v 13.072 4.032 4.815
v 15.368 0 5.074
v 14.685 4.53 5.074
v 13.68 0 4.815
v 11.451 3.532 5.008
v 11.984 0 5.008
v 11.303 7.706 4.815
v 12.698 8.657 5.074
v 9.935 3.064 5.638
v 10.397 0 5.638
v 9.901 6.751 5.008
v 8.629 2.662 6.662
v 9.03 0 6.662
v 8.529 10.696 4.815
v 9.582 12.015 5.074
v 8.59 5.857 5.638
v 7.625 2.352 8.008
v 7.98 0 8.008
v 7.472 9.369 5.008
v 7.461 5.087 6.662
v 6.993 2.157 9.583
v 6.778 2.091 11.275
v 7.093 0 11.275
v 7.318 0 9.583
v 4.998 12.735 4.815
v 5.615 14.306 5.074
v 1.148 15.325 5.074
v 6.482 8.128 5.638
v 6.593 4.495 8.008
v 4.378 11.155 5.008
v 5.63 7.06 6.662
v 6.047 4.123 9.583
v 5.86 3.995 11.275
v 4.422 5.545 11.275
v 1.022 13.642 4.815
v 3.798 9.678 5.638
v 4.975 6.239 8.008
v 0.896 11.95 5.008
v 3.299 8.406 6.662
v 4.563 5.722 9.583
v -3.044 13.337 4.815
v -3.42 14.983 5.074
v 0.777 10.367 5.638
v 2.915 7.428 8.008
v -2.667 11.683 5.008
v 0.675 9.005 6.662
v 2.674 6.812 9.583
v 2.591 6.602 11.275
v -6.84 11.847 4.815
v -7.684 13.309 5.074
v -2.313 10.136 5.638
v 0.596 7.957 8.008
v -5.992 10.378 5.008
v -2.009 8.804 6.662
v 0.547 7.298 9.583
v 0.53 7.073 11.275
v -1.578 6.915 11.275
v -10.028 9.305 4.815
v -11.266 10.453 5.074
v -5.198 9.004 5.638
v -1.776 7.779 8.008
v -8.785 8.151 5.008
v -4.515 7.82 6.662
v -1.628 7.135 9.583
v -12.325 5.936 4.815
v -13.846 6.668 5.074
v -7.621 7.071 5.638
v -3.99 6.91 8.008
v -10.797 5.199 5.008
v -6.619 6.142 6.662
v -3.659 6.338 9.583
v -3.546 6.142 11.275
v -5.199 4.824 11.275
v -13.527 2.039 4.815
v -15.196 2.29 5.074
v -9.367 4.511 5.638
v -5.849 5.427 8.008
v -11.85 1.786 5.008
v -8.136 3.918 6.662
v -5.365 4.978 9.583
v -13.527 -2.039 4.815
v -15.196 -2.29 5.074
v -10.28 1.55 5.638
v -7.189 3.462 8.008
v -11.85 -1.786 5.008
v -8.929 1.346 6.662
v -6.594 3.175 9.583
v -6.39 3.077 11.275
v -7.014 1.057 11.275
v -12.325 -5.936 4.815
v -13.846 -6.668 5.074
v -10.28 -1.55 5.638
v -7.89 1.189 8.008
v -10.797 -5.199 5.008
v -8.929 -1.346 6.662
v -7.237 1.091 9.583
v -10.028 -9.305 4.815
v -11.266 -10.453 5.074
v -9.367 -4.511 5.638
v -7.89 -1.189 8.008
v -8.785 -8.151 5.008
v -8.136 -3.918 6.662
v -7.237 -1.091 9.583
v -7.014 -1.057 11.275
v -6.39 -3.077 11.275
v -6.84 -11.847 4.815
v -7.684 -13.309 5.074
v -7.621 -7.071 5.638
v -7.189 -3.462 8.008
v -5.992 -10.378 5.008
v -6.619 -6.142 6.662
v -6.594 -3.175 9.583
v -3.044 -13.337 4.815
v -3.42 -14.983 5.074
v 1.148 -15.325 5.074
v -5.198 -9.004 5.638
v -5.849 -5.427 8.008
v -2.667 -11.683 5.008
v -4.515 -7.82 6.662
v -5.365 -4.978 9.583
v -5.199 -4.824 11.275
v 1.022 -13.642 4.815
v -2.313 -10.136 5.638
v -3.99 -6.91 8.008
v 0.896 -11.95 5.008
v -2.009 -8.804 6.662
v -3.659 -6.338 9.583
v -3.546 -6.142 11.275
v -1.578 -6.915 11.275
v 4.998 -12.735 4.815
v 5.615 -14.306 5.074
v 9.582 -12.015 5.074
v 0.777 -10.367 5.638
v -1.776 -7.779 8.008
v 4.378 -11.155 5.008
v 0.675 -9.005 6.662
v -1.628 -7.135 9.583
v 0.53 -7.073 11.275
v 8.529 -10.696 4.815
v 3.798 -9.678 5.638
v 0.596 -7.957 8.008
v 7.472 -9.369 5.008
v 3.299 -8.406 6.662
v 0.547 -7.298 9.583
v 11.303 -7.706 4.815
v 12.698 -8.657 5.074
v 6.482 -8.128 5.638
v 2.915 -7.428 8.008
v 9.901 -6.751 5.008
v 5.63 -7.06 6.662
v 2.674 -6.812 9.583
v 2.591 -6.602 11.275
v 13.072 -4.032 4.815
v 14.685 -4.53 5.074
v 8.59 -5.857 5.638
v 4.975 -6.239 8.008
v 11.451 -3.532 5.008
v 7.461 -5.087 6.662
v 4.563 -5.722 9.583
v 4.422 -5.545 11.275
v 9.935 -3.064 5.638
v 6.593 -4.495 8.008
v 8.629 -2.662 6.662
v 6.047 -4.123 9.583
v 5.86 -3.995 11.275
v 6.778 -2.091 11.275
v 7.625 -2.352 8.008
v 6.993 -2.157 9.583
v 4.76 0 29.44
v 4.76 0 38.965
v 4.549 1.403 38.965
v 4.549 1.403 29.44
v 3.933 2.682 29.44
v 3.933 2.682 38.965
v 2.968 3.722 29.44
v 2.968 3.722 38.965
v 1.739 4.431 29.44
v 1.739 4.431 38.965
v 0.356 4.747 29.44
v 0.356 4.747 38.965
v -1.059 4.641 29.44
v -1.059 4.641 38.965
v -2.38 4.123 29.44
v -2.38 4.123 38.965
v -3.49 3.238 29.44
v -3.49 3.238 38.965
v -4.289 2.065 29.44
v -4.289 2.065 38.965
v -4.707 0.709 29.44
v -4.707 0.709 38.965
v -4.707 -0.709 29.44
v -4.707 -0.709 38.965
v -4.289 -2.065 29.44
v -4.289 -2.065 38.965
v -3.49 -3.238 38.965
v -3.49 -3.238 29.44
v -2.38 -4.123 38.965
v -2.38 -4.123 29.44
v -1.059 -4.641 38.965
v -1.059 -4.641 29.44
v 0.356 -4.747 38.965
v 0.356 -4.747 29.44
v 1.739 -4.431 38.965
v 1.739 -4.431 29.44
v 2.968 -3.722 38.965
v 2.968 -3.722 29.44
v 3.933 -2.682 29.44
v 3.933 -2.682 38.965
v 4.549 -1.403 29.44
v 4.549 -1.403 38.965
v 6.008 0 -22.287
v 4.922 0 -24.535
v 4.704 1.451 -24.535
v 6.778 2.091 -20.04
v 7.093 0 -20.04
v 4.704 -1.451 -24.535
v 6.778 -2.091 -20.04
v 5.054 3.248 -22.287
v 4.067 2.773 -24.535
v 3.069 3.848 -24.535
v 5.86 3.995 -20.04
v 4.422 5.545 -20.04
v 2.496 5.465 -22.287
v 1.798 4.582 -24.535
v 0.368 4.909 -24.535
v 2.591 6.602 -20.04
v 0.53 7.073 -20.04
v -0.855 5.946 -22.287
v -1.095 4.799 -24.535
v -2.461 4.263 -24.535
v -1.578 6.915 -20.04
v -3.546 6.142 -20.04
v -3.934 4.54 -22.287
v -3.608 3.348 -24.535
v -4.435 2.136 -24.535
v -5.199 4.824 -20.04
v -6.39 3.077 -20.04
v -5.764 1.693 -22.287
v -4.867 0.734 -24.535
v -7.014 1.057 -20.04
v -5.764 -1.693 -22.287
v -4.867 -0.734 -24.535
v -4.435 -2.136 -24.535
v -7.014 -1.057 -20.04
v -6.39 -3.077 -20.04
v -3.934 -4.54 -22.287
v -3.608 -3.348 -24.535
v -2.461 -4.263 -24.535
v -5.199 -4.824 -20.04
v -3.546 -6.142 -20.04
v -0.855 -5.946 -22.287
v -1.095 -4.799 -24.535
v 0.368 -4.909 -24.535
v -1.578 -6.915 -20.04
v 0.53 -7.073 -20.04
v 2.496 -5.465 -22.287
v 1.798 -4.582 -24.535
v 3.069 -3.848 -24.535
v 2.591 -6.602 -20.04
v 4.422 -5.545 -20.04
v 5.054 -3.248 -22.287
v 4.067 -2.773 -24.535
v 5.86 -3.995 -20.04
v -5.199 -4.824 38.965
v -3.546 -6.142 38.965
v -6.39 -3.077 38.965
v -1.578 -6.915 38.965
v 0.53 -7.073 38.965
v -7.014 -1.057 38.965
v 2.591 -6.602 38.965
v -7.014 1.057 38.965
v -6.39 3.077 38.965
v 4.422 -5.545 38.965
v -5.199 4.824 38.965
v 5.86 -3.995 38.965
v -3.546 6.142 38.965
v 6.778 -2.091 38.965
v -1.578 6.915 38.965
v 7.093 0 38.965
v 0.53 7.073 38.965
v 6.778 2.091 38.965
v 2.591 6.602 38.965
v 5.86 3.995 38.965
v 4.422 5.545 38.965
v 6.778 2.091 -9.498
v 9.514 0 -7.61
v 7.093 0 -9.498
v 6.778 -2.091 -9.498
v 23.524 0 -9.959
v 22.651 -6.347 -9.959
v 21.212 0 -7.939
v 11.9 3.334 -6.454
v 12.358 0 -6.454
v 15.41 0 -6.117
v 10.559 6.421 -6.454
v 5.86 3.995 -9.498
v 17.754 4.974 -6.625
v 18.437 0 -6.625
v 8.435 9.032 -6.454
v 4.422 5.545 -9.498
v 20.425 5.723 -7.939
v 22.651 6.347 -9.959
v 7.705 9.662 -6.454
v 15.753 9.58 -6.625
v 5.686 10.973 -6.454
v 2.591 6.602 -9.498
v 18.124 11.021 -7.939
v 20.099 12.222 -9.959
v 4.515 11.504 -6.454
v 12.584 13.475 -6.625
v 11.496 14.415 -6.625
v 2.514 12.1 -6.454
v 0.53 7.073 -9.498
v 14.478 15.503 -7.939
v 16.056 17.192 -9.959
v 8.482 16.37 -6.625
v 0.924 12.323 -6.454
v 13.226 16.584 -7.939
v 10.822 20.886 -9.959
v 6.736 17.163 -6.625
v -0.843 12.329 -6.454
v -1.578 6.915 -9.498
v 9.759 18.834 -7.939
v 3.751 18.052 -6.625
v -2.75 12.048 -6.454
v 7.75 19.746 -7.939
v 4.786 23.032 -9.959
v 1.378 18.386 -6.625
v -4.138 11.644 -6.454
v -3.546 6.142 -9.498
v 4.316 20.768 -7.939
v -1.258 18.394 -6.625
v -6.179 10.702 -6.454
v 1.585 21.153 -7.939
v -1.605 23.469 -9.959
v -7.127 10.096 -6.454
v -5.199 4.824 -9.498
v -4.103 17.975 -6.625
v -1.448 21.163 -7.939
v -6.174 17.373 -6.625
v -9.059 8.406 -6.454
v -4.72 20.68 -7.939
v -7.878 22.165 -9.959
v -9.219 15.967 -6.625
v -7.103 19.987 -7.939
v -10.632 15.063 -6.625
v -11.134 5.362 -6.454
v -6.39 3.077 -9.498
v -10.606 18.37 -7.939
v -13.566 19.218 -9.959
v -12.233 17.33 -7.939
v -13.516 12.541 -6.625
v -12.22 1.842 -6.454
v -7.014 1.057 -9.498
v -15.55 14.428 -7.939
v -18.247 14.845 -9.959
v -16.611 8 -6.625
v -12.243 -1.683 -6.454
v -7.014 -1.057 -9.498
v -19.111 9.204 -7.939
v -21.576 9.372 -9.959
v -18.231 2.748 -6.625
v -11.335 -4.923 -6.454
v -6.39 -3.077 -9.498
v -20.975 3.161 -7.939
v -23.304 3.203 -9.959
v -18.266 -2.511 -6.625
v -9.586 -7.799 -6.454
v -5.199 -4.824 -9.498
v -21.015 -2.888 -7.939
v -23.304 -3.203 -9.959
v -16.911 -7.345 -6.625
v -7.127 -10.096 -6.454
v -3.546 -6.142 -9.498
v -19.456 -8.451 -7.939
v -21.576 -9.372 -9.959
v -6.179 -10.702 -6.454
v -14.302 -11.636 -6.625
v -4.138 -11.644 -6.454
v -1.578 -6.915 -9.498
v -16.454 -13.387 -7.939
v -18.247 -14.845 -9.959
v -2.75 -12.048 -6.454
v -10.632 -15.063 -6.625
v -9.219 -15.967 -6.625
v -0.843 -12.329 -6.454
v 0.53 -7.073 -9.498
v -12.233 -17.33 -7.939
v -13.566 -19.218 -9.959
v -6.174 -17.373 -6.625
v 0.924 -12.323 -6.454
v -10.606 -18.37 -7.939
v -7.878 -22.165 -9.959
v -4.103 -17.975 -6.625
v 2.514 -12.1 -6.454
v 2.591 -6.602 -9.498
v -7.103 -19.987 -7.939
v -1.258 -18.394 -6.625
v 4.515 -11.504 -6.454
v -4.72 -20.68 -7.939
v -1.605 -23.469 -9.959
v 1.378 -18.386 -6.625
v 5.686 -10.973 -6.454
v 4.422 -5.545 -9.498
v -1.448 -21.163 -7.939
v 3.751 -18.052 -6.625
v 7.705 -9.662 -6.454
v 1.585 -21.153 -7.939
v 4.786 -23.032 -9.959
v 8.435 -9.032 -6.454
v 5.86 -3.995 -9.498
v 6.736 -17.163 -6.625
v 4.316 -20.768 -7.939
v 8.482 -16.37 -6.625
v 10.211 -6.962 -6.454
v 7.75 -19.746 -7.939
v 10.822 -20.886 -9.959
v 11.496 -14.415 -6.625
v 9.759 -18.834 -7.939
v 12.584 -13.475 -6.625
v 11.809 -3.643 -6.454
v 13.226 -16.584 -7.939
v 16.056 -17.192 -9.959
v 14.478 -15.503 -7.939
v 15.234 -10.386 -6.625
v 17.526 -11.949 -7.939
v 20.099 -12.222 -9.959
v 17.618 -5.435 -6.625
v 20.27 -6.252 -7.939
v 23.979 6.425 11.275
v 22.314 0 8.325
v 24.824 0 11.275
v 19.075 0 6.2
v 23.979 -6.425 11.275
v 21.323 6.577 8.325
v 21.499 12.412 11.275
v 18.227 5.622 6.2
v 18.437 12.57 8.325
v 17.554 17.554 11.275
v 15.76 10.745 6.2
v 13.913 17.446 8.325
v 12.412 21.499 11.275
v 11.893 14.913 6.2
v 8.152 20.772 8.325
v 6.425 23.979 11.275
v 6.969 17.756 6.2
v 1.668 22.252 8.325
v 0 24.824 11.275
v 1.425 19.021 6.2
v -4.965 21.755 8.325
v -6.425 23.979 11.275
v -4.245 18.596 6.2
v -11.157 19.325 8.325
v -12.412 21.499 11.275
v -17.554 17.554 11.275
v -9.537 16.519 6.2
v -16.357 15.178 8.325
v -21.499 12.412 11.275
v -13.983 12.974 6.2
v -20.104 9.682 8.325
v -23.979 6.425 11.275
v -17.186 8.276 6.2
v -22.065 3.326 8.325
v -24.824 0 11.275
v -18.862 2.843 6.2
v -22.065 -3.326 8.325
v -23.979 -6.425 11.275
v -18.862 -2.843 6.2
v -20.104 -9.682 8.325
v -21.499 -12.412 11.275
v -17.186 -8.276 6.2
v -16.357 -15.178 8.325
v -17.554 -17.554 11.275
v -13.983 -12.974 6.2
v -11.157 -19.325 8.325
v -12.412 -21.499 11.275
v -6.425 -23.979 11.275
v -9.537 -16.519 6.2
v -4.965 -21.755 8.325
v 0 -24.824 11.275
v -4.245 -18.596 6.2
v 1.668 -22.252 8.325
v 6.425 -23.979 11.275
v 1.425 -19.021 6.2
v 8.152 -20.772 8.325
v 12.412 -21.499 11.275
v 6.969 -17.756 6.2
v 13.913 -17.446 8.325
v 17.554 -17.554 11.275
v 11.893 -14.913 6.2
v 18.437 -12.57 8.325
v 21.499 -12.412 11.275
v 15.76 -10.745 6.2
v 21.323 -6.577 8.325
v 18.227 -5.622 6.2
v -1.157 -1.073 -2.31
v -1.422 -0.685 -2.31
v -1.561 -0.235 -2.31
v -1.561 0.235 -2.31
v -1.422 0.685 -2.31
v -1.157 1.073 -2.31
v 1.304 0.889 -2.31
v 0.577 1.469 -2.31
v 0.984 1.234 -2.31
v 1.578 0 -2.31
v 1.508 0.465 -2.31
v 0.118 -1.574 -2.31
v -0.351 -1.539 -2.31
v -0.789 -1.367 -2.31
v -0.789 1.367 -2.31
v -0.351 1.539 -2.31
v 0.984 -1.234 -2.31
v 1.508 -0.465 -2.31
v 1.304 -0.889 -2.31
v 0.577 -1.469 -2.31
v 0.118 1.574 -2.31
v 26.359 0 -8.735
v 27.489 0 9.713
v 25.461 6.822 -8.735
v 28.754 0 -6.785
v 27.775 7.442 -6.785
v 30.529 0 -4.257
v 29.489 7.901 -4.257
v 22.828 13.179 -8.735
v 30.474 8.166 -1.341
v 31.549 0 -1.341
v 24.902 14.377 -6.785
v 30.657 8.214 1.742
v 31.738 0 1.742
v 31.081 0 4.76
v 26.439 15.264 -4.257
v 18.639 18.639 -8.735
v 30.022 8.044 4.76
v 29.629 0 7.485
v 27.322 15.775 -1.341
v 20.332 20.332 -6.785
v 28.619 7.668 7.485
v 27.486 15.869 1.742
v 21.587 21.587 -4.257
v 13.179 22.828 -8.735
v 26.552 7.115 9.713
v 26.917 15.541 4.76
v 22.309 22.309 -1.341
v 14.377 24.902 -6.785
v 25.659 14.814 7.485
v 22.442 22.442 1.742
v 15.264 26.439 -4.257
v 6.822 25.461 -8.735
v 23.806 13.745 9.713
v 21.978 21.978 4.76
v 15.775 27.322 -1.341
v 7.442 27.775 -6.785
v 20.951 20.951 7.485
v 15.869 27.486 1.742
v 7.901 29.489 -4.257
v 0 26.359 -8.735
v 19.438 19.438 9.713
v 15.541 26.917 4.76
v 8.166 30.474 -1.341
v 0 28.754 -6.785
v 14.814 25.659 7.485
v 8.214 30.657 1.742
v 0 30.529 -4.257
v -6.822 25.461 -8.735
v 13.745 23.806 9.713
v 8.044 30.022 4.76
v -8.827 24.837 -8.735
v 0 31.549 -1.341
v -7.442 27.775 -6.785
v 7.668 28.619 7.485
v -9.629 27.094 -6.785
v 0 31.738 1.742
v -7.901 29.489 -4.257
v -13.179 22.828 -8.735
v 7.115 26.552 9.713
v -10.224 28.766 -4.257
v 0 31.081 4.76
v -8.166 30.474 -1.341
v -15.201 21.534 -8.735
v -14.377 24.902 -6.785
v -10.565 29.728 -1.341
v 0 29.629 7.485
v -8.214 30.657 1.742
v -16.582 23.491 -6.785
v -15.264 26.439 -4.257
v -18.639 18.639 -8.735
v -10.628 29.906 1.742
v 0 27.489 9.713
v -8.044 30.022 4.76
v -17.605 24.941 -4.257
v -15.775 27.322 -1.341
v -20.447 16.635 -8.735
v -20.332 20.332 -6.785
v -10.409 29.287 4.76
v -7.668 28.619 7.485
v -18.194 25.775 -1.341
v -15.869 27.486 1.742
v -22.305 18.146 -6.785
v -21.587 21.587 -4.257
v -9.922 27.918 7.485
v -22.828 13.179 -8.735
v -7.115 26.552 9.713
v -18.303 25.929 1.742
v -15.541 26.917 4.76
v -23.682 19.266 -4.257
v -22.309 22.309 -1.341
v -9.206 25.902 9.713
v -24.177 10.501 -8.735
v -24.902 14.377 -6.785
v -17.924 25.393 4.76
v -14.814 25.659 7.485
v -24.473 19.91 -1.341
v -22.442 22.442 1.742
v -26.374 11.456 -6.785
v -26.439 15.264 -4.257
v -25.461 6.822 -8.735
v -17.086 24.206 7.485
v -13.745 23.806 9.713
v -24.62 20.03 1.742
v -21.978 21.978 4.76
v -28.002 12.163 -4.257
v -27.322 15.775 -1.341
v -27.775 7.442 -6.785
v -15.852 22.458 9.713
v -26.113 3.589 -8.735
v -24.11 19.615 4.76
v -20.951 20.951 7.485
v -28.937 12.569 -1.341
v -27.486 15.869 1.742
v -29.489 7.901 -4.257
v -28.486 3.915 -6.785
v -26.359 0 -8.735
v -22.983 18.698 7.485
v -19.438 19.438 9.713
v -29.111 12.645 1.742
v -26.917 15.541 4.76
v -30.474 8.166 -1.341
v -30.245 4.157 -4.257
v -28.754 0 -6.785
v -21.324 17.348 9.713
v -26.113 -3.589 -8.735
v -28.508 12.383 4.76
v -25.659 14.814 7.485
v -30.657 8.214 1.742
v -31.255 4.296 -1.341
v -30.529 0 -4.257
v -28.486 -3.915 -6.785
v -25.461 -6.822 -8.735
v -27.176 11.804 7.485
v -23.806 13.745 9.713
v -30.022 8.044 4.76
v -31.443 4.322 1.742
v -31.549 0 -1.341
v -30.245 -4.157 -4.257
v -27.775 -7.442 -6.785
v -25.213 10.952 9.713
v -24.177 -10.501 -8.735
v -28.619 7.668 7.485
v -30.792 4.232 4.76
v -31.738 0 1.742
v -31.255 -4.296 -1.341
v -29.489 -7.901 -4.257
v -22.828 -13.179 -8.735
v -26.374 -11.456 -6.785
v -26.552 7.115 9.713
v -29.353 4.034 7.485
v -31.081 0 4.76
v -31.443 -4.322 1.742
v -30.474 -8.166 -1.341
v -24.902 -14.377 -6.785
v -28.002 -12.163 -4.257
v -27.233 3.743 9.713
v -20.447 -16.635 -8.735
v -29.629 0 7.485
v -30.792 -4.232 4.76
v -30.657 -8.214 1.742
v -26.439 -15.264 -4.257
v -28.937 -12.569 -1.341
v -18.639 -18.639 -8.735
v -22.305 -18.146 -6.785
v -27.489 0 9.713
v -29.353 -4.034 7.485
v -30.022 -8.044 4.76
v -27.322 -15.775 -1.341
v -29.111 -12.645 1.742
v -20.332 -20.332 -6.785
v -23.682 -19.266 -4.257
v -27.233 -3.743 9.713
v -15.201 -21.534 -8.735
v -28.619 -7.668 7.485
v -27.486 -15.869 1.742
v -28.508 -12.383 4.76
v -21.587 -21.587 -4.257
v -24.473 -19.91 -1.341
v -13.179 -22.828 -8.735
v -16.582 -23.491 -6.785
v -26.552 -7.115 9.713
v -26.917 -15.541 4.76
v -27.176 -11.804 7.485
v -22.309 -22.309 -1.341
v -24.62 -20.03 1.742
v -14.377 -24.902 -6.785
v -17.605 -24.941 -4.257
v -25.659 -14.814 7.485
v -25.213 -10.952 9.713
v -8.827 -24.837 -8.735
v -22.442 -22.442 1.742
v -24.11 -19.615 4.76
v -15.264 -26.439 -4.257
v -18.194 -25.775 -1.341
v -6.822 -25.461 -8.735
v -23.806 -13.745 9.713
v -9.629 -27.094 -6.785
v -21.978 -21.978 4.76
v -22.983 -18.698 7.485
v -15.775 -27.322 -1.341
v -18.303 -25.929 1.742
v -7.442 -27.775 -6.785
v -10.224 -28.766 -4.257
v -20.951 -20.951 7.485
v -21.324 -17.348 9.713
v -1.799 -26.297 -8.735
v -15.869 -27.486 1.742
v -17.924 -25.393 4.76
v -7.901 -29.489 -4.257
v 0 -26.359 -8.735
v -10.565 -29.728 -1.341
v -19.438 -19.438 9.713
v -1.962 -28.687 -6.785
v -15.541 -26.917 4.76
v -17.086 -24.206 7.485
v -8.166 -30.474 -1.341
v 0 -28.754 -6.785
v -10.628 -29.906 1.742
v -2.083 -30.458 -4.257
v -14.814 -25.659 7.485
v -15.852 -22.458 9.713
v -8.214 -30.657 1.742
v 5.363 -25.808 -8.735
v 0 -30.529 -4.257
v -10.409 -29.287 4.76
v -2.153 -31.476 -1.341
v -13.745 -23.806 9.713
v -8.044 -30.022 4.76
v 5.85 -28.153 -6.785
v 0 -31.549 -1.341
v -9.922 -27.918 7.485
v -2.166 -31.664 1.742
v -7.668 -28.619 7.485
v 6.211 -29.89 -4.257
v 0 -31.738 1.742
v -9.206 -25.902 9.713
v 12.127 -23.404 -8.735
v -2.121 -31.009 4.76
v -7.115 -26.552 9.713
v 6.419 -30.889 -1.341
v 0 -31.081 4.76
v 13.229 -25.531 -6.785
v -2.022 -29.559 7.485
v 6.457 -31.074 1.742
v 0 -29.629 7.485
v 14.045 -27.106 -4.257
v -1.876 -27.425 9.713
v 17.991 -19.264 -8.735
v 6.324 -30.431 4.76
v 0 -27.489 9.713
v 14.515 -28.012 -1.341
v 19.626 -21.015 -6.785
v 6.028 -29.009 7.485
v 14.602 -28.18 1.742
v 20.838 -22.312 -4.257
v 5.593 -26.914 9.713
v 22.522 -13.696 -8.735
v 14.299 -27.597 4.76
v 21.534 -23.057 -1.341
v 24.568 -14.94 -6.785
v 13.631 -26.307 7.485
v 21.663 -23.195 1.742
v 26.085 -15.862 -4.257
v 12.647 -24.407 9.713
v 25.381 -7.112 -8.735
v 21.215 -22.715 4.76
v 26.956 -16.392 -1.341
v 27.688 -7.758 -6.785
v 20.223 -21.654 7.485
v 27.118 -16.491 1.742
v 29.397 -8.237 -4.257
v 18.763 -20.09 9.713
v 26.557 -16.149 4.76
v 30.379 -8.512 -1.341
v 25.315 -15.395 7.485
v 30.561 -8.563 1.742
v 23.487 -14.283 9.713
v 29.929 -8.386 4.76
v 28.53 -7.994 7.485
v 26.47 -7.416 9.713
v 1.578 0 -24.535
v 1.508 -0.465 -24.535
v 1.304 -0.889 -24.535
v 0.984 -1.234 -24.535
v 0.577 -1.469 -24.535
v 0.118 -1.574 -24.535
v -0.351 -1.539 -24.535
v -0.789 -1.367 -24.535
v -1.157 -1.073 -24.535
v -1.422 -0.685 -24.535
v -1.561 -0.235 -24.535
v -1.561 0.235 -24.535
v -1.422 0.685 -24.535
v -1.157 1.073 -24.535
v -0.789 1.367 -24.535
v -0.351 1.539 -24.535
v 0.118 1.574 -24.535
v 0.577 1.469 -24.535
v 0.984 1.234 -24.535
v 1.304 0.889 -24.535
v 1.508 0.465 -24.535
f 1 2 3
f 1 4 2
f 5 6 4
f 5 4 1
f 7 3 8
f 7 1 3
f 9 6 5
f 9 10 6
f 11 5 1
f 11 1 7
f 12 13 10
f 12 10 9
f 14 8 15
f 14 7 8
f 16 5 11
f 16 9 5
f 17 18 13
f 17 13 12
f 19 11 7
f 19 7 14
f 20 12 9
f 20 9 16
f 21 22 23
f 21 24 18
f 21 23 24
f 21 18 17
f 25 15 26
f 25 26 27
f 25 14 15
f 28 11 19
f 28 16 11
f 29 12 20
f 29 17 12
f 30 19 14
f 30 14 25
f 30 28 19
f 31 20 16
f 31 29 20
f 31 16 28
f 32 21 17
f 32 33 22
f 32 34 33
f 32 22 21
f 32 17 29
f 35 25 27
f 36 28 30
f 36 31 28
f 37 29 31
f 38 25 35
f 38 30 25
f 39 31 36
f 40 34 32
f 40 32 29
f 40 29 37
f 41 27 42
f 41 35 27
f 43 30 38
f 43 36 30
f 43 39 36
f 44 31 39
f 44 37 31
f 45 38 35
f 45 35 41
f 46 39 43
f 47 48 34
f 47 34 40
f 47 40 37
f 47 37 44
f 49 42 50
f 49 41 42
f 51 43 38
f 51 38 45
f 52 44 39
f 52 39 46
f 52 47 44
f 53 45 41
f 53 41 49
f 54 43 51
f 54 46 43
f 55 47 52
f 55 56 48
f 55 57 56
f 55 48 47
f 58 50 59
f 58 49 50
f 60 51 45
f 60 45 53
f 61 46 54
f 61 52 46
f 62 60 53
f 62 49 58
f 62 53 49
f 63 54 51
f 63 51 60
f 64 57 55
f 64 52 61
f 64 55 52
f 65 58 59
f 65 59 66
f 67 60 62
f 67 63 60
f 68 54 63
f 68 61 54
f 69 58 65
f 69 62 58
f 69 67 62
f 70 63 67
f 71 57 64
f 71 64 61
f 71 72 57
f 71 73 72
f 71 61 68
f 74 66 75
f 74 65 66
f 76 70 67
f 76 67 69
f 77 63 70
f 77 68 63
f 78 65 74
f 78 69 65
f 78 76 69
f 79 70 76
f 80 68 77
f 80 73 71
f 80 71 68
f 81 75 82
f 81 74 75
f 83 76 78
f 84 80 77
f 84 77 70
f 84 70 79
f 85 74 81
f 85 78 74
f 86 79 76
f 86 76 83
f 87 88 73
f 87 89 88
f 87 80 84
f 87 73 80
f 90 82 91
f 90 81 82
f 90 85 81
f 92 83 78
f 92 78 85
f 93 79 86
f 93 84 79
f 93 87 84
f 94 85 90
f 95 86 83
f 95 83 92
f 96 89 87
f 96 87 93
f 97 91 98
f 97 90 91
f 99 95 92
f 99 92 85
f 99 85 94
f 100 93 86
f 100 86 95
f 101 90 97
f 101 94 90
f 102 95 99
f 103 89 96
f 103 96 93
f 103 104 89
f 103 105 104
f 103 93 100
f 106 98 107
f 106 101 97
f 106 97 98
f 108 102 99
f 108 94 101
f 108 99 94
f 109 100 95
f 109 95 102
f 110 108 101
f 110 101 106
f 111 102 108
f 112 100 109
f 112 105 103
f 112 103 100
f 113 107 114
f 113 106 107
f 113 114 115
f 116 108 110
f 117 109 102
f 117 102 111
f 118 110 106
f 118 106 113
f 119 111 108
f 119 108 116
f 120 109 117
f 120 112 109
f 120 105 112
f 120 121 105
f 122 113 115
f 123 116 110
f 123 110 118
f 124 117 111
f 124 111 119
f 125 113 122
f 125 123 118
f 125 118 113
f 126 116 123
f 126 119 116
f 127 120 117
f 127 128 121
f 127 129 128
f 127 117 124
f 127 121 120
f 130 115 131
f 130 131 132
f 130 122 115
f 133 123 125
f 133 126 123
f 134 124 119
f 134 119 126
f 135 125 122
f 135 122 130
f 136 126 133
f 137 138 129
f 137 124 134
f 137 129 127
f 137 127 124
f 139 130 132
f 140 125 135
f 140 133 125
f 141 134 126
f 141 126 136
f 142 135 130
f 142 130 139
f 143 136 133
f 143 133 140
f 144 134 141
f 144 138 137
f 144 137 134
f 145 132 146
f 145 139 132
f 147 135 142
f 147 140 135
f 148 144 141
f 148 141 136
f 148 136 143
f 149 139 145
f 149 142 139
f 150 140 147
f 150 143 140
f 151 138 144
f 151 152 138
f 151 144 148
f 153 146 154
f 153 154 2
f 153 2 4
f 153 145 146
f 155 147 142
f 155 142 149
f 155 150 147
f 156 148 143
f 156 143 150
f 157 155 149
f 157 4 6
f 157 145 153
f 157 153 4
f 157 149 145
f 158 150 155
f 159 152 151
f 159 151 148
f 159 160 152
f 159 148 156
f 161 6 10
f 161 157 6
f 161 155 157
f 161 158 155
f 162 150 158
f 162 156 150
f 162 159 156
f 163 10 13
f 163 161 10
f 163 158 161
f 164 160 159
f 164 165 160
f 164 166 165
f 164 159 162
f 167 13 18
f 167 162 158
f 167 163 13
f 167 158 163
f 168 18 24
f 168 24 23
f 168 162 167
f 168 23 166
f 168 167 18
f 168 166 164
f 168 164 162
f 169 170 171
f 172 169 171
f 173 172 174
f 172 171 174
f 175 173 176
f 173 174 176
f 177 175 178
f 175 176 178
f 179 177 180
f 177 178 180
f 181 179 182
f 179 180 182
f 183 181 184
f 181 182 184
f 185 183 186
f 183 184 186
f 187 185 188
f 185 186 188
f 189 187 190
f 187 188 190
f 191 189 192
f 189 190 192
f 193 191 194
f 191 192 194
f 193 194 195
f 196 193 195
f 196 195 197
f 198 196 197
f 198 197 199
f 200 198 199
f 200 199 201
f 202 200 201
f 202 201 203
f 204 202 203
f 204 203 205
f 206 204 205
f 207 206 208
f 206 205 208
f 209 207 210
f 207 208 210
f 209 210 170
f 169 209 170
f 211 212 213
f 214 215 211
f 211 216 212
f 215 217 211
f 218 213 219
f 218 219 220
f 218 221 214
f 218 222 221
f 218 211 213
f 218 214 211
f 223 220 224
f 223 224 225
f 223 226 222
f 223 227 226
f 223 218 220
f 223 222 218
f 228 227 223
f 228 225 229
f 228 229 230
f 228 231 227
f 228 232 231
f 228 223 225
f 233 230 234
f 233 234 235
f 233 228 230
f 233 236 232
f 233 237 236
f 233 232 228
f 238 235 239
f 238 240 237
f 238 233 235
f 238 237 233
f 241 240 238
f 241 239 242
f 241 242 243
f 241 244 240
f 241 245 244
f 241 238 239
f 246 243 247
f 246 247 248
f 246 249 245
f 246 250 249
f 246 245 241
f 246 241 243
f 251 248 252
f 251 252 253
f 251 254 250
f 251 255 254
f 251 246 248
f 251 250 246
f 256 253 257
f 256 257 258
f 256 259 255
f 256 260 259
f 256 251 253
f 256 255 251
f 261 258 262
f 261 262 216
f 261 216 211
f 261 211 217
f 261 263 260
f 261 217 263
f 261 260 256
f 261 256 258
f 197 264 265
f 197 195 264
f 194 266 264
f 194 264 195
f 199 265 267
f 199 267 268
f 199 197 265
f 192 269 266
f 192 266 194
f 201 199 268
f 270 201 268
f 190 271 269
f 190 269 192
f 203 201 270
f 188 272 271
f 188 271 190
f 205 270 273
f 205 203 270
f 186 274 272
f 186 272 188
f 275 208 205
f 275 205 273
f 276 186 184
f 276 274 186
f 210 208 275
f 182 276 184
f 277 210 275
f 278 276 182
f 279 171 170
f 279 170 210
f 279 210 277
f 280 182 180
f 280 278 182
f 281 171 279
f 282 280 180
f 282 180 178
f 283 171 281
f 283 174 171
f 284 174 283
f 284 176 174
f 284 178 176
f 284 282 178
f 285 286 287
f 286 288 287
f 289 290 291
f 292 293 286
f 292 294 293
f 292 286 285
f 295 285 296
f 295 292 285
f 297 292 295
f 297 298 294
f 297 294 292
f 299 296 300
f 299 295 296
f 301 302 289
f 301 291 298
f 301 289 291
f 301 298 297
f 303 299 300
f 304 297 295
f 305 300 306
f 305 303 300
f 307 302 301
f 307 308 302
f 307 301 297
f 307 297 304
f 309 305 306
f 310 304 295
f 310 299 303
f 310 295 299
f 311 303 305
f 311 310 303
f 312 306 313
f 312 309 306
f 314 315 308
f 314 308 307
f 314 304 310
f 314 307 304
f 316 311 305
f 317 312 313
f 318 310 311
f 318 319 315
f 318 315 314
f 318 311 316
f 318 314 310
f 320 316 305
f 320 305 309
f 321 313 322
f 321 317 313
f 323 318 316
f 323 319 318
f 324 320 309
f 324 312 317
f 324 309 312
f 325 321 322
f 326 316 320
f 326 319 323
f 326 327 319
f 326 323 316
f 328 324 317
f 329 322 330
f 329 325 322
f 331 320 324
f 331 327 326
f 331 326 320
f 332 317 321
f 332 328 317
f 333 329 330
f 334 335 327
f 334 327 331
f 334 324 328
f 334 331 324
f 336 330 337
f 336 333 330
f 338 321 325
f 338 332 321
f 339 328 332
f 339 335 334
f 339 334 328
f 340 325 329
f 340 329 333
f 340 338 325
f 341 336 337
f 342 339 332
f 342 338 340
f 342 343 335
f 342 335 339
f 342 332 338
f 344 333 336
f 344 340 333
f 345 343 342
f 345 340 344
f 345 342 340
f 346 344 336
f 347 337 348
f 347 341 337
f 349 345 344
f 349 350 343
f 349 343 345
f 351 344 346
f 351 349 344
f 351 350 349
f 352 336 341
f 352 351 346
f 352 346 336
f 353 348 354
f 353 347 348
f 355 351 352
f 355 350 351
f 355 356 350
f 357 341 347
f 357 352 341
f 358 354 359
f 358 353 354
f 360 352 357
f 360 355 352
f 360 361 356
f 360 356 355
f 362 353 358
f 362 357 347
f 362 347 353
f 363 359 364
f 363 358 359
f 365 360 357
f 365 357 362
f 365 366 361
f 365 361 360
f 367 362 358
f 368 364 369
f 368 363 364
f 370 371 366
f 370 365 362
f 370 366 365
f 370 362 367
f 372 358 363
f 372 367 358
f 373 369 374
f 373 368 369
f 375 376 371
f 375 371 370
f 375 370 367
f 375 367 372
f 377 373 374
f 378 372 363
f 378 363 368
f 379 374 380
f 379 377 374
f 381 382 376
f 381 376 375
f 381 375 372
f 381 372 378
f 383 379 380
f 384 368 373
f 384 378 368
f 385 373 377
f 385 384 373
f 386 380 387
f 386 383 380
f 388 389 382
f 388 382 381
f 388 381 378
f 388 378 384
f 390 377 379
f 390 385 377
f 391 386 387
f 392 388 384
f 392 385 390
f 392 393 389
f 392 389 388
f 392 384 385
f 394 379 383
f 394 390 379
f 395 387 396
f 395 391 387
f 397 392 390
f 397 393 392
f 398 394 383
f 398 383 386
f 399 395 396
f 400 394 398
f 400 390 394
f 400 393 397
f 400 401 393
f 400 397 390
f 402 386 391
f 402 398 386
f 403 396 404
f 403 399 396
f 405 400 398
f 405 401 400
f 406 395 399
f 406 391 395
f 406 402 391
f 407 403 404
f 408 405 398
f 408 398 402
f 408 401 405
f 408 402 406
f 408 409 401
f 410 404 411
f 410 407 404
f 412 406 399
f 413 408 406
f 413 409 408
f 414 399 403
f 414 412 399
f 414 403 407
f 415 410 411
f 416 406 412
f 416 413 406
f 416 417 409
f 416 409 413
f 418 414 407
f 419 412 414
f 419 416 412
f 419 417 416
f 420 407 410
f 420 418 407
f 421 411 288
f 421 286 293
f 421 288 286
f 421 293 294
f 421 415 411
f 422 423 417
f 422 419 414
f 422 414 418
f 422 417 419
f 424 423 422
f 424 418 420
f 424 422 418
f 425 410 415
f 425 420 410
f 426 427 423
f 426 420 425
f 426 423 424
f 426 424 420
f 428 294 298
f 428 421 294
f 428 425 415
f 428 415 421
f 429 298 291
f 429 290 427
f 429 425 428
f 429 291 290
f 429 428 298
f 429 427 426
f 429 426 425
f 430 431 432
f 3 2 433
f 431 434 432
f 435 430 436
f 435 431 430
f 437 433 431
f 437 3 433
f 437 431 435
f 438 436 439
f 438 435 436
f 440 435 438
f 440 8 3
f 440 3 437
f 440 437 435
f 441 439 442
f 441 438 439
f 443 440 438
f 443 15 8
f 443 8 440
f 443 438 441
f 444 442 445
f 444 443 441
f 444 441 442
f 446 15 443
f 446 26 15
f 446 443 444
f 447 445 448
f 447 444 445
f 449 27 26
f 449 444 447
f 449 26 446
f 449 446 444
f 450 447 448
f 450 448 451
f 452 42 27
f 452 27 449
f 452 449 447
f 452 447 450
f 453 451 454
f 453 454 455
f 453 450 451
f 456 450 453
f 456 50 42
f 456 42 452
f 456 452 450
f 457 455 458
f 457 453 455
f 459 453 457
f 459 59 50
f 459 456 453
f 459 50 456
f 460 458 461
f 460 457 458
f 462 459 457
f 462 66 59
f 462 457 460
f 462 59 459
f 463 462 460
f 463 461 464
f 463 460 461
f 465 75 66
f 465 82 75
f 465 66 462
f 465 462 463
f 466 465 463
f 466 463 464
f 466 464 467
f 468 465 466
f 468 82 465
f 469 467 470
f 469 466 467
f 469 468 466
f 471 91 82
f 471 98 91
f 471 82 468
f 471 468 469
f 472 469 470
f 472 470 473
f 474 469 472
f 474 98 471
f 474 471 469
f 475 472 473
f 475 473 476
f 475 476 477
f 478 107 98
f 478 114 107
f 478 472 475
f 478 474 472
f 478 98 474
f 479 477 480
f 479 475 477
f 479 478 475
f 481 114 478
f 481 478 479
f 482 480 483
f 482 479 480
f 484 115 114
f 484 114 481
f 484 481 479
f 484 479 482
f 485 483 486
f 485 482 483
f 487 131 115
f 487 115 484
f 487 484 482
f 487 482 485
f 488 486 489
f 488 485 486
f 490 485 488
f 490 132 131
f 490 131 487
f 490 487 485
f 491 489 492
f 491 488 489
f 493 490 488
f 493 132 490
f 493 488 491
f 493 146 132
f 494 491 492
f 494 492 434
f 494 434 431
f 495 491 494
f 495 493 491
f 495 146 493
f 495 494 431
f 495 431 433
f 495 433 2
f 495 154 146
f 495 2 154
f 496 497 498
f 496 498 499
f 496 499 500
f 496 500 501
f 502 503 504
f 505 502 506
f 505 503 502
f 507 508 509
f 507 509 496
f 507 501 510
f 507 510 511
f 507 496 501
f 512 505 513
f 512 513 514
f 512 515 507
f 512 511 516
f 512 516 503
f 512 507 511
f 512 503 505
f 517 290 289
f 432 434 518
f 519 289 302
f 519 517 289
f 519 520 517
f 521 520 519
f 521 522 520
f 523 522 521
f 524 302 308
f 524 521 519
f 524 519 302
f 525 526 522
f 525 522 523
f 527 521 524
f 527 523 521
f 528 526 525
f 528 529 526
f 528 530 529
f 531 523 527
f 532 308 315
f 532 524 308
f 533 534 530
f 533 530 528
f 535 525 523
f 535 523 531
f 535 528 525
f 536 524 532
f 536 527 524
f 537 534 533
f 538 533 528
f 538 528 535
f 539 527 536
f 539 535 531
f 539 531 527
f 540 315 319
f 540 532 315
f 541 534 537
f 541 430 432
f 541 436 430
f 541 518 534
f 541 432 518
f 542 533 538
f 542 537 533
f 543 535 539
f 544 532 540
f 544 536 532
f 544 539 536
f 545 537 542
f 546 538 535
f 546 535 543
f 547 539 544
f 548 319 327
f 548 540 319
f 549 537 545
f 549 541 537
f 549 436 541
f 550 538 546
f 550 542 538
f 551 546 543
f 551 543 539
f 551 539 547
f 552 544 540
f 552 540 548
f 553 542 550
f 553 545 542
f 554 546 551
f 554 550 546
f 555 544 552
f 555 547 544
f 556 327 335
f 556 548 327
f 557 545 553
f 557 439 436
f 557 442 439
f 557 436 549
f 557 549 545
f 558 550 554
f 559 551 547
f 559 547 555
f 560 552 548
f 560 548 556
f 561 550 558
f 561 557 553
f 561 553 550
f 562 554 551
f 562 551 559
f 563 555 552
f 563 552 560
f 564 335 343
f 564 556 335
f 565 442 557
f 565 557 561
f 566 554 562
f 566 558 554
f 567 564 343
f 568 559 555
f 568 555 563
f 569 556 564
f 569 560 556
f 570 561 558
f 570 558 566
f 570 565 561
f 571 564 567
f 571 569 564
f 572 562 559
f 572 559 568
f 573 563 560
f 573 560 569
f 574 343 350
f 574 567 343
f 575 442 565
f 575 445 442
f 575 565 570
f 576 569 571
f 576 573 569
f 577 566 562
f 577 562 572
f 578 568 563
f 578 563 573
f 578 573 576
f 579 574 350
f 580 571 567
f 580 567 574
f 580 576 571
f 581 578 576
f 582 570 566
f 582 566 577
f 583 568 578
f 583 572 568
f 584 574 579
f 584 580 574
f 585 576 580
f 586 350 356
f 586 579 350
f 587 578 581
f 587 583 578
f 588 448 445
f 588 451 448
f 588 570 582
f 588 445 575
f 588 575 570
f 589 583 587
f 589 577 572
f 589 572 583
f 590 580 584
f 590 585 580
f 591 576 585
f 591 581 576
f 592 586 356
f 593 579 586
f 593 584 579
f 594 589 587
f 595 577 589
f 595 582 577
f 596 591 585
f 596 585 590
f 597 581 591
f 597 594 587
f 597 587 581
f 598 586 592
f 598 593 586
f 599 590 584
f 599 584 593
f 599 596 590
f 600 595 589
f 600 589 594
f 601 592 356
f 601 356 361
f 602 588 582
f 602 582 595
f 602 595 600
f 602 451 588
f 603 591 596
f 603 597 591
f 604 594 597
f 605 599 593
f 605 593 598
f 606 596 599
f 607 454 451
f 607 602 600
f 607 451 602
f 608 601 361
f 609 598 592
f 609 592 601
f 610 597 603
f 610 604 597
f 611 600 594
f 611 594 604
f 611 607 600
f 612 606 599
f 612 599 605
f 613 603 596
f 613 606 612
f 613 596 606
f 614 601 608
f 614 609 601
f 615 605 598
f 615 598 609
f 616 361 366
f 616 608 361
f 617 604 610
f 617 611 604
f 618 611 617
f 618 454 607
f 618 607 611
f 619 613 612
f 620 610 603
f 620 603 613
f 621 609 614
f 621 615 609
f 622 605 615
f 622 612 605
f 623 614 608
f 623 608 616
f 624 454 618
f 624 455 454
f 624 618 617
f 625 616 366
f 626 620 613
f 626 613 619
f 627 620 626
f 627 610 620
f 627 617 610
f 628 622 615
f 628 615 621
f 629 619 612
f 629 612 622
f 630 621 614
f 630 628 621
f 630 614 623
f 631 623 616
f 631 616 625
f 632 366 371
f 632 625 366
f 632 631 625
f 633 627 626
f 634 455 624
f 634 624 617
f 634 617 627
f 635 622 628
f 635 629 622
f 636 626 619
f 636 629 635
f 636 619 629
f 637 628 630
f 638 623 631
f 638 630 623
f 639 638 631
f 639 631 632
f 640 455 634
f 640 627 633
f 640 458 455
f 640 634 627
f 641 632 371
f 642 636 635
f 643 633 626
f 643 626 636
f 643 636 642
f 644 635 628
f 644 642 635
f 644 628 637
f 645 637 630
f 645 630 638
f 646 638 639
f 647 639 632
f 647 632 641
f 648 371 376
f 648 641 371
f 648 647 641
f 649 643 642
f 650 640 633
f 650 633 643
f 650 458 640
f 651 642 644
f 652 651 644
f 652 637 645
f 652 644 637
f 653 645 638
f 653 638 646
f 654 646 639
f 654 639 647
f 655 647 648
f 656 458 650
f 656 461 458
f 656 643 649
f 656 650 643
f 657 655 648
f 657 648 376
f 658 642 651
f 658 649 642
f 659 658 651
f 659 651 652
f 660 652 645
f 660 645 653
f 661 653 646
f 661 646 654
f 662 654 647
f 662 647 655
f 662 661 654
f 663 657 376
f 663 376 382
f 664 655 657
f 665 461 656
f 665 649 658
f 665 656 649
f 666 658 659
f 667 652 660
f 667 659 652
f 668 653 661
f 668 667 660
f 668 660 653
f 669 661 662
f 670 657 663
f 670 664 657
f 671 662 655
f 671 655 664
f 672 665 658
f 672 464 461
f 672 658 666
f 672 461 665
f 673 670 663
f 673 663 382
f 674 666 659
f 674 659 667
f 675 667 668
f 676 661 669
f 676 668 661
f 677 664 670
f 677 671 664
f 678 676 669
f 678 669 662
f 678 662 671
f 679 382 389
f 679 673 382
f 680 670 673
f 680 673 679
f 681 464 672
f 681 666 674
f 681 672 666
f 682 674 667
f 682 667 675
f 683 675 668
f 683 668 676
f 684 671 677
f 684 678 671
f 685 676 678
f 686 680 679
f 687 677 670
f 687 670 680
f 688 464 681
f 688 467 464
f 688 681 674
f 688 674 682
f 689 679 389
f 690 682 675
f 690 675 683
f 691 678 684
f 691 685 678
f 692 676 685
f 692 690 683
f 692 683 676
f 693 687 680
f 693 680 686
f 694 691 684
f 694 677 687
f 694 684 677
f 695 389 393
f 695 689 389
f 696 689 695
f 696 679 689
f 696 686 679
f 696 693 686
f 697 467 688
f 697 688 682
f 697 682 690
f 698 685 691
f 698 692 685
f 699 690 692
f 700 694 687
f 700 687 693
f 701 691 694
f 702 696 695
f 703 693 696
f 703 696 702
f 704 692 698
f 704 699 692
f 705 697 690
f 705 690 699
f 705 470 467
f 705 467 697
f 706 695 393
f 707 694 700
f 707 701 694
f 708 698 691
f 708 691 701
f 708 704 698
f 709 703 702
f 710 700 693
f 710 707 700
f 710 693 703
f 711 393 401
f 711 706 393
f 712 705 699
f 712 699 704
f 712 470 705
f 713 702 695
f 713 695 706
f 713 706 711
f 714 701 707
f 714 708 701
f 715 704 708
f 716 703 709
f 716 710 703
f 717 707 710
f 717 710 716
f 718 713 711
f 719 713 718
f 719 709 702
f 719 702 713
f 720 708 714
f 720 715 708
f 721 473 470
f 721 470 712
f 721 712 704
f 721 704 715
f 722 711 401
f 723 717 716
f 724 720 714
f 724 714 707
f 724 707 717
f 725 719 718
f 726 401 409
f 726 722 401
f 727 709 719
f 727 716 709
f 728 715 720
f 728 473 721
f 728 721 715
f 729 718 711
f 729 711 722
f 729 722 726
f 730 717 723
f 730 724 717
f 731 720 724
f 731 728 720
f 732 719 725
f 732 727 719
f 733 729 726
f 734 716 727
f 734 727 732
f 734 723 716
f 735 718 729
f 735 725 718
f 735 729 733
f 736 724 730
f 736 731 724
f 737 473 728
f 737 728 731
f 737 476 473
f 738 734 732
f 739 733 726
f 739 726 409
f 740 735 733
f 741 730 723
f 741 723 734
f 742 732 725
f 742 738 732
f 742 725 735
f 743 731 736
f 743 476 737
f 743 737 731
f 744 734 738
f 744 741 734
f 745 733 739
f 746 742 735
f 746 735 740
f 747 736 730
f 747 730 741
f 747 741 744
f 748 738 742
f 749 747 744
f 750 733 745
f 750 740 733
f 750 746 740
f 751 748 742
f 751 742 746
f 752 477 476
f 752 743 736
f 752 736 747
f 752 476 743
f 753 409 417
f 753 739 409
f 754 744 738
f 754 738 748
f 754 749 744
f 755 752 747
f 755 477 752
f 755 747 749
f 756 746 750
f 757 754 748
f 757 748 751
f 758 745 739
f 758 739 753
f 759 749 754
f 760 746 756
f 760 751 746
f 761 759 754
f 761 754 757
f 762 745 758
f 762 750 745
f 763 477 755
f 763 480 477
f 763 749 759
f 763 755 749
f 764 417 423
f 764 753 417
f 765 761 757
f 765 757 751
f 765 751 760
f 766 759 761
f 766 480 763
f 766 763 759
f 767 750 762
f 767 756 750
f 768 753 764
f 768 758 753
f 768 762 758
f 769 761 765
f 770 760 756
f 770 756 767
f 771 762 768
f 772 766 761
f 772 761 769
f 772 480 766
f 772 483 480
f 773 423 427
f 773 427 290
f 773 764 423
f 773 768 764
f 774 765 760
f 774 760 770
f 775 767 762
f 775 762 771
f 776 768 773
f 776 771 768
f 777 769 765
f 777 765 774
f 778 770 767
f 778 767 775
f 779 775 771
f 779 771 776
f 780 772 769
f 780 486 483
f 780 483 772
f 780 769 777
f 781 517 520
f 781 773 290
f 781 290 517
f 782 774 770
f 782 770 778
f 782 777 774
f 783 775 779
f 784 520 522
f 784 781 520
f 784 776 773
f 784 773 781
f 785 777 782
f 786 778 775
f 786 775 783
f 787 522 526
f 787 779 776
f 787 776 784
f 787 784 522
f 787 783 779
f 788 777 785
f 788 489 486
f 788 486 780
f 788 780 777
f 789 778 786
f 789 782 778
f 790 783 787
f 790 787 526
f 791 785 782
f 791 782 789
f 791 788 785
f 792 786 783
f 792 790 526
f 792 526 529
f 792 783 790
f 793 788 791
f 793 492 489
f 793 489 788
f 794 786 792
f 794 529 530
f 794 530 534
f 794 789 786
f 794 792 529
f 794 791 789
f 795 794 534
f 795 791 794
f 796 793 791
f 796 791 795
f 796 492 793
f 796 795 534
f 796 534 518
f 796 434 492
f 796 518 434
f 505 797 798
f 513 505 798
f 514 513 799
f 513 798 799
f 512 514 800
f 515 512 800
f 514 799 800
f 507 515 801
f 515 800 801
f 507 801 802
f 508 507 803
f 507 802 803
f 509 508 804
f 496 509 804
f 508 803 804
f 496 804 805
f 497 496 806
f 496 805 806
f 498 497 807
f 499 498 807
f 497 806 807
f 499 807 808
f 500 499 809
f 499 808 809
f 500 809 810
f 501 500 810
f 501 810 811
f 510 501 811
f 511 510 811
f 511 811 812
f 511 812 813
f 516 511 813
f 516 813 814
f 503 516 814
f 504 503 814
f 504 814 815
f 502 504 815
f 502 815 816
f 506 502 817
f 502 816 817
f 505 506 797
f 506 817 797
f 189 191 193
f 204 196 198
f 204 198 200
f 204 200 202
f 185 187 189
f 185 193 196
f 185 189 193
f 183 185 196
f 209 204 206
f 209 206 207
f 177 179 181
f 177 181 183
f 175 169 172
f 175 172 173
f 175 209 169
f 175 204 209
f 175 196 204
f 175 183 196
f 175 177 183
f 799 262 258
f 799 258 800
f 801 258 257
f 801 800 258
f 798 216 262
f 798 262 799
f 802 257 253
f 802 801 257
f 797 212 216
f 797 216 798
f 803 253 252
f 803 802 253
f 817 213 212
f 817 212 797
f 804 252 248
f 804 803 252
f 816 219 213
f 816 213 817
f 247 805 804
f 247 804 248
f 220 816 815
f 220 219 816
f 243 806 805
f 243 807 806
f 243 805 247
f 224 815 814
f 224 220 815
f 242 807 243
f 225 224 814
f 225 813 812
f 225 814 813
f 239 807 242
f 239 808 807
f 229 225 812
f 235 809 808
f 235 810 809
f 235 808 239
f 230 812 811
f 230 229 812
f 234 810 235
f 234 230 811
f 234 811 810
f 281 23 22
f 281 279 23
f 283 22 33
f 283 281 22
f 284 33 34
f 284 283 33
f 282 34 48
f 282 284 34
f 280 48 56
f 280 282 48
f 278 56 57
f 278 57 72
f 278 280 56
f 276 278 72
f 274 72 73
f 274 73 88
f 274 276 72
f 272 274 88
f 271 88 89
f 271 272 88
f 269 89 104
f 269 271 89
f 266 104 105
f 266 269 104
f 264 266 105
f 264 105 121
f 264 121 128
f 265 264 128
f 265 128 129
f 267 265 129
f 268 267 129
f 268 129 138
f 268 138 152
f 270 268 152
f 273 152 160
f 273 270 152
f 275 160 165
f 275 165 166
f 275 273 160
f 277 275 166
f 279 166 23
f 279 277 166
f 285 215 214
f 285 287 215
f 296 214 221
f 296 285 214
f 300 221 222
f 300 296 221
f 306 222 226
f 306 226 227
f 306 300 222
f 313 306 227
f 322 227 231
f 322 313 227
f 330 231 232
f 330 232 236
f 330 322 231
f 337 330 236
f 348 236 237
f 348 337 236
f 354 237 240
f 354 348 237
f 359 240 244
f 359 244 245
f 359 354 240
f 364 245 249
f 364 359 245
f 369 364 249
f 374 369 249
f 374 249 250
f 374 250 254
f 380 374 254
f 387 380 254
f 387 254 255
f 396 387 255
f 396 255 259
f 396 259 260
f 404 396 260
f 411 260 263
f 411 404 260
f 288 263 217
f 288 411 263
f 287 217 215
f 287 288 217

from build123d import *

# Parameters (mm, degrees)
F2_R     = 4.760298
F3_DEPTH = 9.525
F4_R     = 1.578177
F5_DEPTH = 22.225


with BuildPart() as f1:
    # F0 (on Front) → F1 (revolve)
    with BuildSketch(Plane.XZ):
        with BuildLine():
            Line((0, 38.964737), (0, -24.535263))
            Line((0, -24.535263), (4.922395, -24.535263))
            Line((4.922395, -24.535263), (7.092721, -20.039586))
            Line((7.092721, -20.039586), (7.092721, -9.498))
            ThreePointArc((7.092721, -9.498), (15.409558, -6.117437), (23.523532, -9.959494))
            ThreePointArc((23.523532, -9.959494), (31.75, 0.193678), (24.824452, 11.275126))
            ThreePointArc((24.824452, 11.275126), (20.770385, 7.146589), (15.368029, 5.074192))
            ThreePointArc((15.368029, 5.074192), (9.67931, 6.104722), (7.092721, 11.275126))
            Line((7.092721, 11.275126), (7.092721, 38.964737))
            Line((7.092721, 38.964737), (0, 38.964737))
        make_face()
    revolve(axis=Axis((0, 0, 7.214737), (0, 0, 1)))

    # F2 (on face) → F3 (cut)
    with BuildSketch(Plane.XY.offset(38.964737)):
        Circle(F2_R)
    extrude(amount=-F3_DEPTH, mode=Mode.SUBTRACT)

    # F4 (on face) → F5 (cut)
    with BuildSketch(Plane(origin=(0, 0, -24.535263), x_dir=(1, 0, 0), z_dir=(0, 0, -1))):
        Circle(F4_R)
    extrude(amount=-F5_DEPTH, mode=Mode.SUBTRACT)


solid = f1.part
